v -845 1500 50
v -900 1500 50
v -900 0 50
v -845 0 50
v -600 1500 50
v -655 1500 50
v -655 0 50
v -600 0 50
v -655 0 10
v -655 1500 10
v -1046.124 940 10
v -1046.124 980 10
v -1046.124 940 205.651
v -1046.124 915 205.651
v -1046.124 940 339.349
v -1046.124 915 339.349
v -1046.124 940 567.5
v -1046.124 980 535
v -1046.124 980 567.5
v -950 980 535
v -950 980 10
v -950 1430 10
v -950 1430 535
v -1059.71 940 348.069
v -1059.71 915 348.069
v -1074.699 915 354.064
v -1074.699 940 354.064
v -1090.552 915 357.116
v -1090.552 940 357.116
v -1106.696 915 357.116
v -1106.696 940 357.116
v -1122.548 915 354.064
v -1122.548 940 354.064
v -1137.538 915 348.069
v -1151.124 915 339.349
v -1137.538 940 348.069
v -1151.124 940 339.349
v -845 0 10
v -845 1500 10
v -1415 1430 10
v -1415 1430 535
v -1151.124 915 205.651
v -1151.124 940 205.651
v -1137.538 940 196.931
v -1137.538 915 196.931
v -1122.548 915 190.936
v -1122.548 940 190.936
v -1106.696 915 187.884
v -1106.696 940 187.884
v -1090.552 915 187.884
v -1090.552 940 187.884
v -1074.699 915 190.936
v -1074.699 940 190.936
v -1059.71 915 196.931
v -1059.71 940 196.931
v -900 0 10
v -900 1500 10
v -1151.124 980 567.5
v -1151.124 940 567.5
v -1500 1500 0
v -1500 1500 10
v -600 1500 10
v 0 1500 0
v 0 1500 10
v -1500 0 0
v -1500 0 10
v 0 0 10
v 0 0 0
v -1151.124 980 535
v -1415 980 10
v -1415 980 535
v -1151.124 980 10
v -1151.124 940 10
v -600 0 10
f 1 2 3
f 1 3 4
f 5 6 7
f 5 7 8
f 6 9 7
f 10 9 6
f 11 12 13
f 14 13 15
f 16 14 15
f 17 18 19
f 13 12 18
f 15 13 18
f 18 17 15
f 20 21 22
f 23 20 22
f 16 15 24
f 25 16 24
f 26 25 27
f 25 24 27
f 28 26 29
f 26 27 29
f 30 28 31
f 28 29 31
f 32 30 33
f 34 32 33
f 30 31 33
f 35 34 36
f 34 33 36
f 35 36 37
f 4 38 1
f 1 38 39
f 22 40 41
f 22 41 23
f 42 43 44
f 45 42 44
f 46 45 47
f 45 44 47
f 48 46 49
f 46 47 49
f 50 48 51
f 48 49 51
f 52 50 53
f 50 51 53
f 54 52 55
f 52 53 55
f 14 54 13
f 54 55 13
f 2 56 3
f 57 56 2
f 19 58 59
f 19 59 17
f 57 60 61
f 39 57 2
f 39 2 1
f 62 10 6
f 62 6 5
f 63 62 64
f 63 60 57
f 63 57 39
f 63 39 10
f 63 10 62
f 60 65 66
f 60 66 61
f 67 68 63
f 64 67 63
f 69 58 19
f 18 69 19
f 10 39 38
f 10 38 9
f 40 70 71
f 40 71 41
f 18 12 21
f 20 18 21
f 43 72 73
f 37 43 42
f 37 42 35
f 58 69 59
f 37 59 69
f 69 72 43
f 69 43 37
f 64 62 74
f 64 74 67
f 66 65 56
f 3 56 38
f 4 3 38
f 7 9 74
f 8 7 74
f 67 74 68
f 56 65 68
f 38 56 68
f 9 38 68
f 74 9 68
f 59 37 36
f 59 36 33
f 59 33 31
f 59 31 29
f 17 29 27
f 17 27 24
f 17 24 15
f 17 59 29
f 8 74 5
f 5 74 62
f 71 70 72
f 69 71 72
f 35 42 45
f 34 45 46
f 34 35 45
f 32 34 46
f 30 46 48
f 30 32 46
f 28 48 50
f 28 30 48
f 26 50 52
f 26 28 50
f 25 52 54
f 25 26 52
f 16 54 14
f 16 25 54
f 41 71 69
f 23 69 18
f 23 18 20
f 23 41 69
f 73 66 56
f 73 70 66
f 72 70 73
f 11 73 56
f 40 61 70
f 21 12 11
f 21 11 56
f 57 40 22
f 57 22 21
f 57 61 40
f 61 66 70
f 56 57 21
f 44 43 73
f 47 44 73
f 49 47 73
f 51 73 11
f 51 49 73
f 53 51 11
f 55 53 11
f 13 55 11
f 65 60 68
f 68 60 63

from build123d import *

# Parameters (mm, degrees)
SKETCH1_W           = 1500
SKETCH1_H           = 1500
BOSS_EXTRUDE1_DEPTH = 10
SKETCH2_W           = 465
SKETCH2_H           = 450
BOSS_EXTRUDE2_DEPTH = 525
SKETCH3_W           = 105
SKETCH3_H           = 557.5
BOSS_EXTRUDE3_DEPTH = 40
BOSS_EXTRUDE4_DEPTH = 65
SKETCH4_W           = 55
SKETCH4_H           = 1500
BOSS_EXTRUDE5_DEPTH = 40


with BuildPart() as part:
    # Sketch1 → Boss-Extrude1 (new body)
    with BuildSketch(Plane.XY):
        with Locations((-750, 750)):
            Rectangle(SKETCH1_W, SKETCH1_H)
    extrude(amount=BOSS_EXTRUDE1_DEPTH)

    # Sketch2 → Boss-Extrude2 (add)
    with BuildSketch(Plane.XY.offset(10)):
        with Locations((-1182.5, 1205)):
            Rectangle(SKETCH2_W, SKETCH2_H)
    extrude(amount=BOSS_EXTRUDE2_DEPTH)

    # Sketch3 → Boss-Extrude3 (add)
    with BuildSketch(Plane.XZ.offset(-980)):
        with Locations((-1098.62392171, 288.75)):
            Rectangle(SKETCH3_W, SKETCH3_H)
    extrude(amount=BOSS_EXTRUDE3_DEPTH)

    # Sketch3<3> → Boss-Extrude4 (add)
    with BuildSketch(Plane.XZ.offset(-980)):
        with BuildLine():
            ThreePointArc((-1046.12392171, 339.348709786), (-1098.62392171, 357.5), (-1151.12392171, 339.348709786))
            Line((-1151.12392171, 339.348709786), (-1151.12392171, 205.651290214))
            ThreePointArc((-1151.12392171, 205.651290214), (-1098.62392171, 187.5), (-1046.12392171, 205.651290214))
            Line((-1046.12392171, 205.651290214), (-1046.12392171, 339.348709786))
        make_face()
    extrude(amount=BOSS_EXTRUDE4_DEPTH)

    # Sketch4 → Boss-Extrude5 (add)
    with BuildSketch(Plane.XY.offset(10)):
        with Locations((-872.5, 750)):
            Rectangle(SKETCH4_W, SKETCH4_H)
        with Locations((-627.5, 750)):
            Rectangle(SKETCH4_W, SKETCH4_H)
    extrude(amount=BOSS_EXTRUDE5_DEPTH)


solid = part.part
